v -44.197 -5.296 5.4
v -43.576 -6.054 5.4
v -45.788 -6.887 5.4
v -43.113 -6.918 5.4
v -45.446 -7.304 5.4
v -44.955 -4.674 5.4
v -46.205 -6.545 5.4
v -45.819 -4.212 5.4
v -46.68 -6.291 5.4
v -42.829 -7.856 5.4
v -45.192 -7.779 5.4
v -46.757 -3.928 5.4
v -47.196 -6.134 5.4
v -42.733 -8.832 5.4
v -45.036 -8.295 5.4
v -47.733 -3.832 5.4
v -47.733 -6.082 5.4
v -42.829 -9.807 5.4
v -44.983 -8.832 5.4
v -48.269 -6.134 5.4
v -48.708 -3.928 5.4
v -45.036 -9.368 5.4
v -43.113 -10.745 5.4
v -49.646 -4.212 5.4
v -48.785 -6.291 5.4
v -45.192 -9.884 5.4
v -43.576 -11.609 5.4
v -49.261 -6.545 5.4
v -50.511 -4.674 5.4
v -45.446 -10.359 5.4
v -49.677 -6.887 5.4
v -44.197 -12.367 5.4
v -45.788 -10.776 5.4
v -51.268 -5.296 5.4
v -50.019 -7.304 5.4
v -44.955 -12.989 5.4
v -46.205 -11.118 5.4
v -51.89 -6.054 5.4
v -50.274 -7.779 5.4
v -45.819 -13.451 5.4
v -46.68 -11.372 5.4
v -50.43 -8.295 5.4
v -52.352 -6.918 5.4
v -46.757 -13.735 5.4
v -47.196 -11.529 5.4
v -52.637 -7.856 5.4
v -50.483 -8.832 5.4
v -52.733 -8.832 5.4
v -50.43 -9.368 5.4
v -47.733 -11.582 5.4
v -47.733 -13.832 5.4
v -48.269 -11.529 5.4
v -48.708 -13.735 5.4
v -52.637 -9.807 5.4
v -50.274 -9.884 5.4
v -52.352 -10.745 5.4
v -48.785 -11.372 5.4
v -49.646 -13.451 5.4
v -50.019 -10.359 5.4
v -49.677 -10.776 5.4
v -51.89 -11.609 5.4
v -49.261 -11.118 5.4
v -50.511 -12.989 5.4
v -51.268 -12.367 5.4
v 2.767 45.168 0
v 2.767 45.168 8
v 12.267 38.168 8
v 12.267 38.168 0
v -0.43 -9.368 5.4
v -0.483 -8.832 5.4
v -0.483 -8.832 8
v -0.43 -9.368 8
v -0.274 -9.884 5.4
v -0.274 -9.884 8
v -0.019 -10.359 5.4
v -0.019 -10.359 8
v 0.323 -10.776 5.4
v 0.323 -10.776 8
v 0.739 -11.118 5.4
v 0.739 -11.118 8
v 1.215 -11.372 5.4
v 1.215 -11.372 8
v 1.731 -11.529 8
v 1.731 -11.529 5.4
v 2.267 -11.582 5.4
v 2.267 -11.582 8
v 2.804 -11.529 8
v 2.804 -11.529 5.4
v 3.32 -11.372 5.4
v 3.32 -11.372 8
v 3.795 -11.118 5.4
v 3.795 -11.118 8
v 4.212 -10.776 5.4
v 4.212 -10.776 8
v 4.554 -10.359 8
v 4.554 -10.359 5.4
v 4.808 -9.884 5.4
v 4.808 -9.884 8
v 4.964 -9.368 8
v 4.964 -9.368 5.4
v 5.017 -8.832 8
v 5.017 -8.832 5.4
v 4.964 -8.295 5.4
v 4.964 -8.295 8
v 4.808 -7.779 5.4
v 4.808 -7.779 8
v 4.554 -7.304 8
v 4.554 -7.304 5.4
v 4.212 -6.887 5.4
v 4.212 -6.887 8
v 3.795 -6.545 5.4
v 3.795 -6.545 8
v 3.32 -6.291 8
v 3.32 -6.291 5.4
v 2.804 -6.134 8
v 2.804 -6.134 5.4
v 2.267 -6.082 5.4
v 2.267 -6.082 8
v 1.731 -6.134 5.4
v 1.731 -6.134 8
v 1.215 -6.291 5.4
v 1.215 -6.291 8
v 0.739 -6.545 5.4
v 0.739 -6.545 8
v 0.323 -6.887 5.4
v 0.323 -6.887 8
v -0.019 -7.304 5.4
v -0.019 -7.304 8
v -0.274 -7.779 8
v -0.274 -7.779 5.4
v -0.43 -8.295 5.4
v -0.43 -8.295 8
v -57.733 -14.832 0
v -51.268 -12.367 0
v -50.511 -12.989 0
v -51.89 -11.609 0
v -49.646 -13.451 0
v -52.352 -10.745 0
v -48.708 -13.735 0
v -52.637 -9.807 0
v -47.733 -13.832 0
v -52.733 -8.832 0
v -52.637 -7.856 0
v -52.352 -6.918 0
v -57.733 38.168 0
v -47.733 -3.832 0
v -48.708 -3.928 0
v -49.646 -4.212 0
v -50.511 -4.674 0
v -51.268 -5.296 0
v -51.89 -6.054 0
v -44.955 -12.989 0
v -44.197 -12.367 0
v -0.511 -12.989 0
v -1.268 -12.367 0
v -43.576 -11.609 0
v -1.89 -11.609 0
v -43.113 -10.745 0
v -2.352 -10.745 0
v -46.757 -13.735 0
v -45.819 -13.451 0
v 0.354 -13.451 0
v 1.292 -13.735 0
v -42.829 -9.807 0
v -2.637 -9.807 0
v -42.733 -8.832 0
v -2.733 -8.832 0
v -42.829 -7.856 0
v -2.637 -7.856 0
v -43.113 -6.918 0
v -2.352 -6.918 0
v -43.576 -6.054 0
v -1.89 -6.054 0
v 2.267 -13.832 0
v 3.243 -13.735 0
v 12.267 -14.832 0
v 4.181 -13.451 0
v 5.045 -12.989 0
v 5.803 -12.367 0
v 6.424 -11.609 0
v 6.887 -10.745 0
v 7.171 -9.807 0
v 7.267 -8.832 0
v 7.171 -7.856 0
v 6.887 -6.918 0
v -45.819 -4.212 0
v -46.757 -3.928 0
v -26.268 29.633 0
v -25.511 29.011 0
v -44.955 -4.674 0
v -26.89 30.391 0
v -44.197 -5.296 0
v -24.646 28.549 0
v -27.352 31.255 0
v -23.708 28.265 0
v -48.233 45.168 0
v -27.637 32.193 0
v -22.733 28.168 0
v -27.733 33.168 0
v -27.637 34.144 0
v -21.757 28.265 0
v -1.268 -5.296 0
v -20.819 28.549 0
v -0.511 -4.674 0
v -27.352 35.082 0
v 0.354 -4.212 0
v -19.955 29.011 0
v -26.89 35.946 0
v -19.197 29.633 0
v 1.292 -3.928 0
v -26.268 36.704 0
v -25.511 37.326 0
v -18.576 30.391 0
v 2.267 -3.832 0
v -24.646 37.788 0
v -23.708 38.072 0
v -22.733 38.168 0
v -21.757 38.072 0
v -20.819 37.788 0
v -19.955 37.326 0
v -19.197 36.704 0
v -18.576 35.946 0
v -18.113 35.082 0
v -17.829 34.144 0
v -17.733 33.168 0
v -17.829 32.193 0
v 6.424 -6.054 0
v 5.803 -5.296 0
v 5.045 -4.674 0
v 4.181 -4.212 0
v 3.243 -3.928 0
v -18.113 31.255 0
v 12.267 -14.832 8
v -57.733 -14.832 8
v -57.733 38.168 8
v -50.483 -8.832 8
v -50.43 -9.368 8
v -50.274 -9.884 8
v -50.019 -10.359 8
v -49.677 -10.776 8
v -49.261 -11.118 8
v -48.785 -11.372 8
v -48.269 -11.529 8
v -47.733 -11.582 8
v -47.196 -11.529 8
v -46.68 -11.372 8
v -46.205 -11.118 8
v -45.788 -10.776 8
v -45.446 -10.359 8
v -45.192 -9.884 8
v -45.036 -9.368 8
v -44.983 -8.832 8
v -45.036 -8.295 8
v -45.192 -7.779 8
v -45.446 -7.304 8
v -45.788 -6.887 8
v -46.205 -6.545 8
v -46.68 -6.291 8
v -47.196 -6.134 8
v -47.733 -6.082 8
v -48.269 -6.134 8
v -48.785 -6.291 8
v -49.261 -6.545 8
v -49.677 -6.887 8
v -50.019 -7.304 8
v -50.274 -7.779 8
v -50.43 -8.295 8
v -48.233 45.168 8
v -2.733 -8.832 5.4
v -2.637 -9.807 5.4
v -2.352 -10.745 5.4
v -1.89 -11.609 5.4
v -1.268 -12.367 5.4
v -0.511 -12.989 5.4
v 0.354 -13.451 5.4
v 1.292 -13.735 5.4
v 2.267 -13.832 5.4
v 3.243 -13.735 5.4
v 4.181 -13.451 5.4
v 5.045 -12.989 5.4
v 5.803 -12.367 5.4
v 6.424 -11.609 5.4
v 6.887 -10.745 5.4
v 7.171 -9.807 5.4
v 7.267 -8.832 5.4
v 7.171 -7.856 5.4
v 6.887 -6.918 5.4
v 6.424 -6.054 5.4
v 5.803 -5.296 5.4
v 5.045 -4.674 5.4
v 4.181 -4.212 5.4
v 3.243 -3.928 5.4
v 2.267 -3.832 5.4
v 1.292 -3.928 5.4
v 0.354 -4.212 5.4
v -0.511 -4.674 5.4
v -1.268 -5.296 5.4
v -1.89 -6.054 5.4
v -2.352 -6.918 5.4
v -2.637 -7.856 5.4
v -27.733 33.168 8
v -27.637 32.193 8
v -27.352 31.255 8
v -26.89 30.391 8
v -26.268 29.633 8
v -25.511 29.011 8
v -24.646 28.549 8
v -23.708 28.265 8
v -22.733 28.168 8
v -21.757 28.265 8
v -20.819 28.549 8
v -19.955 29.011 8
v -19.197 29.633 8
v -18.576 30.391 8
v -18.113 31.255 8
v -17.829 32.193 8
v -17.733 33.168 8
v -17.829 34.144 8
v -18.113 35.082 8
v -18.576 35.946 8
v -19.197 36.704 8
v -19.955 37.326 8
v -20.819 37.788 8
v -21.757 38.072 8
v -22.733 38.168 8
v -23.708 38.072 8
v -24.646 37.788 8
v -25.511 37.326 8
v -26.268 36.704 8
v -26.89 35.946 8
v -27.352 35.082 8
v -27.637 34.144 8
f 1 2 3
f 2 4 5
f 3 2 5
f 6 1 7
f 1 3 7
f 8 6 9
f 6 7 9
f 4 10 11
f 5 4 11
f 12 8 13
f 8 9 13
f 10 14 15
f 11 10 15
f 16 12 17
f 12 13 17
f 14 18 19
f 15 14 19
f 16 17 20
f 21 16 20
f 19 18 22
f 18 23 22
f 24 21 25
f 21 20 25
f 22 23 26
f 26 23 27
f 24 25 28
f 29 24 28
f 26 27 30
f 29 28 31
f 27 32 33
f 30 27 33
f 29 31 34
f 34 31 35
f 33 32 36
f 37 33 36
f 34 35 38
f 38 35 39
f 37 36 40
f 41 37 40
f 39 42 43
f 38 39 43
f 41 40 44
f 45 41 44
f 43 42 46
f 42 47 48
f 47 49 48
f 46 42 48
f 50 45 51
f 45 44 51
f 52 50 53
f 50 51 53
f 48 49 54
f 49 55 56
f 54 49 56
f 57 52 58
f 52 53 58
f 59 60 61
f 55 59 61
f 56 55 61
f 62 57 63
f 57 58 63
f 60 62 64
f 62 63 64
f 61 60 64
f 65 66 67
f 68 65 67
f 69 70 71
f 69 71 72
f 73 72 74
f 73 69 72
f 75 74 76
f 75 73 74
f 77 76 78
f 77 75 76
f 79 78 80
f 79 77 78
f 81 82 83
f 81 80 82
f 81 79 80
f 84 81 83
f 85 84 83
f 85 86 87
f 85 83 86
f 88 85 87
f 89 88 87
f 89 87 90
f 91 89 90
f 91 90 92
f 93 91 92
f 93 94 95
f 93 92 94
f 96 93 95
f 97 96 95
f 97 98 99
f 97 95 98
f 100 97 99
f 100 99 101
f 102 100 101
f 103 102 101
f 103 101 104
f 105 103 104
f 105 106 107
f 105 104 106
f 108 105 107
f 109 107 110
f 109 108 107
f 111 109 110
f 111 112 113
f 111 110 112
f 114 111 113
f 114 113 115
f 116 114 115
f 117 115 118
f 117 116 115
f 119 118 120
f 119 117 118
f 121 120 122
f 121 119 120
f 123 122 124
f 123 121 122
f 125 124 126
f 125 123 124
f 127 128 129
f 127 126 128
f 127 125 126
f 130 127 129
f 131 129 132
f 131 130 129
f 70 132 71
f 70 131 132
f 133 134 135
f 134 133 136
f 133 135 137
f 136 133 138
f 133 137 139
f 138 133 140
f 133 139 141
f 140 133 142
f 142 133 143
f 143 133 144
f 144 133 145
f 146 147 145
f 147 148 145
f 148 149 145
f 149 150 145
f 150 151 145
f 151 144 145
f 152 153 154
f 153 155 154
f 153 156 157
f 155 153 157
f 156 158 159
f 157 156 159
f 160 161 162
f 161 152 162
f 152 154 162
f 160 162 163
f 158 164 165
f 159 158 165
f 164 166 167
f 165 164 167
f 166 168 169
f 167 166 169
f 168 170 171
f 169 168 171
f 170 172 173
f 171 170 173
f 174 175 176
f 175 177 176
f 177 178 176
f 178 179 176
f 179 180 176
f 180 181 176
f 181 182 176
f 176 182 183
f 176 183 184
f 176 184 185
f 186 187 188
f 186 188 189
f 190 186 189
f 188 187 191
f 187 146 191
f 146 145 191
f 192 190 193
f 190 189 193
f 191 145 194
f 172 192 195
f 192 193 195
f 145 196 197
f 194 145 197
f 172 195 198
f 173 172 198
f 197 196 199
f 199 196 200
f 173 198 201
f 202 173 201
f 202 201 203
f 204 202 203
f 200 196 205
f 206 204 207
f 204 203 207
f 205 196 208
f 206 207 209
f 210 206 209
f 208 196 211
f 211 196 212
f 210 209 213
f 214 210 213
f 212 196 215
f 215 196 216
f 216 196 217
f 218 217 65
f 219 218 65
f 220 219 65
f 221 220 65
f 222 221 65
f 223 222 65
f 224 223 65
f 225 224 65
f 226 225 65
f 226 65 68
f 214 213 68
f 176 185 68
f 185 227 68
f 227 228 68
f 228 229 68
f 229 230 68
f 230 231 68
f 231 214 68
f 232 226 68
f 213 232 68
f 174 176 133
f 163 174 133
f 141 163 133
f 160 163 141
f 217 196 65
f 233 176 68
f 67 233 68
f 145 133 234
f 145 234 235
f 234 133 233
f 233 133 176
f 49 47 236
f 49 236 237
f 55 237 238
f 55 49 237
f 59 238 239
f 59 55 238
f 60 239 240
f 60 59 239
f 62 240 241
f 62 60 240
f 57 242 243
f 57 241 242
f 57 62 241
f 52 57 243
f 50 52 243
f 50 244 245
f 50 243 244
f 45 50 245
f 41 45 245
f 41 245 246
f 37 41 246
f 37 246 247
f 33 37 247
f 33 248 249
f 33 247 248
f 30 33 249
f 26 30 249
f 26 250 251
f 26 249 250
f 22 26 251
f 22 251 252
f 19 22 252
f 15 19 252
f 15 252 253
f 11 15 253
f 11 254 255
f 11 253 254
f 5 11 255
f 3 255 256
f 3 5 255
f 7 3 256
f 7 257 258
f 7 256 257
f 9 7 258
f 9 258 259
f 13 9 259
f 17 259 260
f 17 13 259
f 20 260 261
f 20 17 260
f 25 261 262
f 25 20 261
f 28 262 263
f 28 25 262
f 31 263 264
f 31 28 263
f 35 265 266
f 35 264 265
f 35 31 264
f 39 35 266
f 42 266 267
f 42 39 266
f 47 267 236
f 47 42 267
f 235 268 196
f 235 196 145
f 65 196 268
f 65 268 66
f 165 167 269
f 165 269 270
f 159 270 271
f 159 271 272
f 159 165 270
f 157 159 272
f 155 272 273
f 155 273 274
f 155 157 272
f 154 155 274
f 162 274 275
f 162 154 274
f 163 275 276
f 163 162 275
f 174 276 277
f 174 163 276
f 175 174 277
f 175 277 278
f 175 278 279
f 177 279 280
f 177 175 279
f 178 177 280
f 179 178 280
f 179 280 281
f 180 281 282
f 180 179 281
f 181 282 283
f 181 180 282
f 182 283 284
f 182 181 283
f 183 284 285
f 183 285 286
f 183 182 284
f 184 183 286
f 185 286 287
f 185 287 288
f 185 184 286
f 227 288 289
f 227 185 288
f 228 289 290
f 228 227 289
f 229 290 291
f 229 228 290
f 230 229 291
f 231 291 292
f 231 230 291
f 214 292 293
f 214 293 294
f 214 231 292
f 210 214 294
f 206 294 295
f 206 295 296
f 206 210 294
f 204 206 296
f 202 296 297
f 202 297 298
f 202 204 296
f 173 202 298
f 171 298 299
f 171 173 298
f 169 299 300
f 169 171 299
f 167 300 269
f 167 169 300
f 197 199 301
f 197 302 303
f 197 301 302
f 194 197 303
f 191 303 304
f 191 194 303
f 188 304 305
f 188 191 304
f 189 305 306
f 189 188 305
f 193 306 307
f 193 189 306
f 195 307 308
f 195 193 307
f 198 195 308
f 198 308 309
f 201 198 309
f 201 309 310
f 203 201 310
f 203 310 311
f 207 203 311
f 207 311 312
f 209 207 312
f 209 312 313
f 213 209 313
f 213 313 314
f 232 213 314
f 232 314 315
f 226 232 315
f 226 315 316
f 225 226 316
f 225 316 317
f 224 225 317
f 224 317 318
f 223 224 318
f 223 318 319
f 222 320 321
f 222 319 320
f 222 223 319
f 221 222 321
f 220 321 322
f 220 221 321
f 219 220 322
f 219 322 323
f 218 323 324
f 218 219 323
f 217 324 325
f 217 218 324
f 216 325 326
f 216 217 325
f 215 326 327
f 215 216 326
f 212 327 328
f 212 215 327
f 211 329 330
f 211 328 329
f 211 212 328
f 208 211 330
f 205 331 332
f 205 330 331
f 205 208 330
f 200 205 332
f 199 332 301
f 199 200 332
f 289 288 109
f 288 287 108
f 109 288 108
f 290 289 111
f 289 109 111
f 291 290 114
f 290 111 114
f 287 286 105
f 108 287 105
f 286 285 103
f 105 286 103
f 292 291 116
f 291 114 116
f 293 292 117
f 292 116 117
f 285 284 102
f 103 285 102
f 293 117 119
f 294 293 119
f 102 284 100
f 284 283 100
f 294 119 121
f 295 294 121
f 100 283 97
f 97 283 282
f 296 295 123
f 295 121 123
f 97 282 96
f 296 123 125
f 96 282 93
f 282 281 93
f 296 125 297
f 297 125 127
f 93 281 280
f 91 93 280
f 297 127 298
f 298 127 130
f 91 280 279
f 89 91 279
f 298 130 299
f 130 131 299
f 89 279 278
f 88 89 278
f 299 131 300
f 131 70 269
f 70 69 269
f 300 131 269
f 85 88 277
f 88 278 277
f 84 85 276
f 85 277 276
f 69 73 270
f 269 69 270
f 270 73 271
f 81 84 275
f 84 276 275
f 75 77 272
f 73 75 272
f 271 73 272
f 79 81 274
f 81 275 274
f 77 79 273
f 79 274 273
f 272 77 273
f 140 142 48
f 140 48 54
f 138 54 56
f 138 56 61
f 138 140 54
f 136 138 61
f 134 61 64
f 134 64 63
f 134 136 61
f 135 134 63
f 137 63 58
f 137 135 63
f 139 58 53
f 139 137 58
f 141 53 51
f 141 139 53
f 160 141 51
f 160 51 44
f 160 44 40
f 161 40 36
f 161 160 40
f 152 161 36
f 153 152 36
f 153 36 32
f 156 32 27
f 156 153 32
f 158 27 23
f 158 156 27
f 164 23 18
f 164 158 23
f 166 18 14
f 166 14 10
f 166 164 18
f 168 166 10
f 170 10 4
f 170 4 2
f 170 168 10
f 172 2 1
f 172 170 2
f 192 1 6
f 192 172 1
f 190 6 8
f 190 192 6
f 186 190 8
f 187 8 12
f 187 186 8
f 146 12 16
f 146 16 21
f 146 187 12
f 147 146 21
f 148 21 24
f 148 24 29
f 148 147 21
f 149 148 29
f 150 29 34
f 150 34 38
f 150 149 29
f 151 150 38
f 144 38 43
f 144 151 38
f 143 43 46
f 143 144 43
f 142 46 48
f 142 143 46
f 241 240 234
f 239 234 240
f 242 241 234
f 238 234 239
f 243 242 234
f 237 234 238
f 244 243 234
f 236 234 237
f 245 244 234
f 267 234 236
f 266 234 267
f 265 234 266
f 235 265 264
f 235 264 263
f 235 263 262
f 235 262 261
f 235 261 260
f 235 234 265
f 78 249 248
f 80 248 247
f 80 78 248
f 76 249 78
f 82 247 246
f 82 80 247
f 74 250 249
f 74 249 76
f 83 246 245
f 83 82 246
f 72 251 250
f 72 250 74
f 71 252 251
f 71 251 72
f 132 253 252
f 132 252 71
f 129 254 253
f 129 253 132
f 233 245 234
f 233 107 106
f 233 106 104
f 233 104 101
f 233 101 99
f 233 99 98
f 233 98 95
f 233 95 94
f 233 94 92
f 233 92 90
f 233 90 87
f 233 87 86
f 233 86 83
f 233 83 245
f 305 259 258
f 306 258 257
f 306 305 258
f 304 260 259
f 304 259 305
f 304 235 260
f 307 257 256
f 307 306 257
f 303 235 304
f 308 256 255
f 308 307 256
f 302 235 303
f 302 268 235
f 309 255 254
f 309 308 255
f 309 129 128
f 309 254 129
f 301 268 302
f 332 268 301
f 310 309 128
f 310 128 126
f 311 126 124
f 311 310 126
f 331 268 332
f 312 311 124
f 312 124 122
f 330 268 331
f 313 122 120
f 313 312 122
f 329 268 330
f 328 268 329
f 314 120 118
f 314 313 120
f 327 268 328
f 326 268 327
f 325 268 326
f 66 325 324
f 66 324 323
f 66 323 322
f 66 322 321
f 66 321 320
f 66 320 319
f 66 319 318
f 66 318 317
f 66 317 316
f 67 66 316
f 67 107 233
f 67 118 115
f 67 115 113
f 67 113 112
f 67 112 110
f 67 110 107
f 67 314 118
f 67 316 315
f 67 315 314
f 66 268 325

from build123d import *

# Parameters (mm, degrees)
SKETCH1_W               = 70
SKETCH1_H               = 60
BOSS_EXTRUDE2_DEPTH     = 8
CUT_EXTRUDE3_DEPTH      = 37
CUT_EXTRUDE3_DEPTH_BACK = 30
SKETCH1_5_R             = 2.75
CUT_EXTRUDE4_DEPTH      = 30
CUT_EXTRUDE4_DEPTH_BACK = 30
SKETCH1_7_R             = 2.75
CUT_EXTRUDE5_DEPTH      = 42
CUT_EXTRUDE5_DEPTH_BACK = 88
SKETCH1_8_R             = 5
CUT_EXTRUDE6_DEPTH      = 42
SKETCH1_9_R             = 5
CUT_EXTRUDE7_DEPTH      = 5.4
SKETCH1_10_R            = 5
CUT_EXTRUDE8_DEPTH      = 5.4


with BuildPart() as part:
    # Sketch1 → Boss-Extrude2 (new body)
    with BuildSketch(Plane.XY):
        with Locations((-22.732855119, 15.168432036)):
            Rectangle(SKETCH1_W, SKETCH1_H)
    extrude(amount=BOSS_EXTRUDE2_DEPTH)

    # Sketch1<5> → Cut-Extrude3 (cut, two sides: drawn at the far end of the back side and taken through both)
    with BuildSketch(Plane.XY.offset(-CUT_EXTRUDE3_DEPTH_BACK)):
        with Locations((-47.732855119, -8.831567964)):
            Circle(SKETCH1_5_R)
    extrude(amount=CUT_EXTRUDE3_DEPTH + CUT_EXTRUDE3_DEPTH_BACK, mode=Mode.SUBTRACT)

    # Sketch1<7> → Cut-Extrude4 (cut, two sides: drawn at the far end of the back side and taken through both)
    with BuildSketch(Plane.XY.offset(-CUT_EXTRUDE4_DEPTH_BACK)):
        with Locations((2.267144881, -8.831567964)):
            Circle(SKETCH1_7_R)
    extrude(amount=CUT_EXTRUDE4_DEPTH + CUT_EXTRUDE4_DEPTH_BACK, mode=Mode.SUBTRACT)

    # Sketch1<8> → Cut-Extrude5 (cut, two sides: drawn at the far end of the back side and taken through both)
    with BuildSketch(Plane.XY.offset(-CUT_EXTRUDE5_DEPTH_BACK)):
        with Locations((-22.732855119, 33.168432036)):
            Circle(SKETCH1_8_R)
    extrude(amount=CUT_EXTRUDE5_DEPTH + CUT_EXTRUDE5_DEPTH_BACK, mode=Mode.SUBTRACT)

    # Sketch3 → Cut-Extrude6 (cut)
    with BuildSketch(Plane.XY.offset(8)):
        Polygon((-48.232855119, 45.168432036), (-57.732855119, 38.168432036), (-57.732855119, 45.168432036), align=None)
        Polygon((2.767144881, 45.168432036), (12.267144881, 38.168432036), (12.267144881, 45.168432036), align=None)
    extrude(amount=-CUT_EXTRUDE6_DEPTH, mode=Mode.SUBTRACT)

    # Sketch1<9> → Cut-Extrude7 (cut)
    with BuildSketch(Plane.XY):
        with Locations((-47.732855119, -8.831567964)):
            Circle(SKETCH1_9_R)
    extrude(amount=CUT_EXTRUDE7_DEPTH, mode=Mode.SUBTRACT)

    # Sketch1<10> → Cut-Extrude8 (cut)
    with BuildSketch(Plane.XY):
        with Locations((2.267144881, -8.831567964)):
            Circle(SKETCH1_10_R)
    extrude(amount=CUT_EXTRUDE8_DEPTH, mode=Mode.SUBTRACT)


solid = part.part
